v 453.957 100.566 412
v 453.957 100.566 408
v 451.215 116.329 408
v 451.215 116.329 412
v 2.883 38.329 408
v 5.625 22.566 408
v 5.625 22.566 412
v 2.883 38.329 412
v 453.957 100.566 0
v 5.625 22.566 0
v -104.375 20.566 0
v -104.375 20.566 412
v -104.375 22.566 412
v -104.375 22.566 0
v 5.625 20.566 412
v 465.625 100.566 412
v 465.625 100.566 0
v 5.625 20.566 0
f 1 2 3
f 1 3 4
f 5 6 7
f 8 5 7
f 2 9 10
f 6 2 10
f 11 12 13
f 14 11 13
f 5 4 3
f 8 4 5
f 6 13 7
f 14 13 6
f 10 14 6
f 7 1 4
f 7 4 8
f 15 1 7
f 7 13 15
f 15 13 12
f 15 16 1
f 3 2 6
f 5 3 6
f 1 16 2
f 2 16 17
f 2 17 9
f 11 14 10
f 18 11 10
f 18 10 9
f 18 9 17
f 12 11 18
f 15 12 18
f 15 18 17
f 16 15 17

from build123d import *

# Parameters (mm, degrees)
F0_W     = 110
F0_H     = 2
F1_DEPTH = 412
F2_W     = 455.0662100537
F2_H     = 4
F3_DEPTH = 16


with BuildPart() as f1:
    # F0 (on Top) → F1 (new body)
    with BuildSketch(Plane.XY):
        with Locations((-49.3745803833, 21.5659940839)):
            Rectangle(F0_W, F0_H)
        Polygon((5.6254196167, 22.5659940839), (5.6254196167, 20.5659940839), (465.6254196127, 100.5659940832), (453.9570552758, 100.5659940832), align=None)
    extrude(amount=F1_DEPTH)

    # F2 (on face) → F3 (join)
    with BuildSketch(Plane(origin=(-3.6453815607, 20.9530753552, 0), x_dir=(-0.9852008911, -0.1714036294, 0), z_dir=(-0.1714036294, 0.9852008911, 0))):
        with Locations((-236.9431667321, 410)):
            Rectangle(F2_W, F2_H)
    extrude(amount=F3_DEPTH)


solid = f1.part
